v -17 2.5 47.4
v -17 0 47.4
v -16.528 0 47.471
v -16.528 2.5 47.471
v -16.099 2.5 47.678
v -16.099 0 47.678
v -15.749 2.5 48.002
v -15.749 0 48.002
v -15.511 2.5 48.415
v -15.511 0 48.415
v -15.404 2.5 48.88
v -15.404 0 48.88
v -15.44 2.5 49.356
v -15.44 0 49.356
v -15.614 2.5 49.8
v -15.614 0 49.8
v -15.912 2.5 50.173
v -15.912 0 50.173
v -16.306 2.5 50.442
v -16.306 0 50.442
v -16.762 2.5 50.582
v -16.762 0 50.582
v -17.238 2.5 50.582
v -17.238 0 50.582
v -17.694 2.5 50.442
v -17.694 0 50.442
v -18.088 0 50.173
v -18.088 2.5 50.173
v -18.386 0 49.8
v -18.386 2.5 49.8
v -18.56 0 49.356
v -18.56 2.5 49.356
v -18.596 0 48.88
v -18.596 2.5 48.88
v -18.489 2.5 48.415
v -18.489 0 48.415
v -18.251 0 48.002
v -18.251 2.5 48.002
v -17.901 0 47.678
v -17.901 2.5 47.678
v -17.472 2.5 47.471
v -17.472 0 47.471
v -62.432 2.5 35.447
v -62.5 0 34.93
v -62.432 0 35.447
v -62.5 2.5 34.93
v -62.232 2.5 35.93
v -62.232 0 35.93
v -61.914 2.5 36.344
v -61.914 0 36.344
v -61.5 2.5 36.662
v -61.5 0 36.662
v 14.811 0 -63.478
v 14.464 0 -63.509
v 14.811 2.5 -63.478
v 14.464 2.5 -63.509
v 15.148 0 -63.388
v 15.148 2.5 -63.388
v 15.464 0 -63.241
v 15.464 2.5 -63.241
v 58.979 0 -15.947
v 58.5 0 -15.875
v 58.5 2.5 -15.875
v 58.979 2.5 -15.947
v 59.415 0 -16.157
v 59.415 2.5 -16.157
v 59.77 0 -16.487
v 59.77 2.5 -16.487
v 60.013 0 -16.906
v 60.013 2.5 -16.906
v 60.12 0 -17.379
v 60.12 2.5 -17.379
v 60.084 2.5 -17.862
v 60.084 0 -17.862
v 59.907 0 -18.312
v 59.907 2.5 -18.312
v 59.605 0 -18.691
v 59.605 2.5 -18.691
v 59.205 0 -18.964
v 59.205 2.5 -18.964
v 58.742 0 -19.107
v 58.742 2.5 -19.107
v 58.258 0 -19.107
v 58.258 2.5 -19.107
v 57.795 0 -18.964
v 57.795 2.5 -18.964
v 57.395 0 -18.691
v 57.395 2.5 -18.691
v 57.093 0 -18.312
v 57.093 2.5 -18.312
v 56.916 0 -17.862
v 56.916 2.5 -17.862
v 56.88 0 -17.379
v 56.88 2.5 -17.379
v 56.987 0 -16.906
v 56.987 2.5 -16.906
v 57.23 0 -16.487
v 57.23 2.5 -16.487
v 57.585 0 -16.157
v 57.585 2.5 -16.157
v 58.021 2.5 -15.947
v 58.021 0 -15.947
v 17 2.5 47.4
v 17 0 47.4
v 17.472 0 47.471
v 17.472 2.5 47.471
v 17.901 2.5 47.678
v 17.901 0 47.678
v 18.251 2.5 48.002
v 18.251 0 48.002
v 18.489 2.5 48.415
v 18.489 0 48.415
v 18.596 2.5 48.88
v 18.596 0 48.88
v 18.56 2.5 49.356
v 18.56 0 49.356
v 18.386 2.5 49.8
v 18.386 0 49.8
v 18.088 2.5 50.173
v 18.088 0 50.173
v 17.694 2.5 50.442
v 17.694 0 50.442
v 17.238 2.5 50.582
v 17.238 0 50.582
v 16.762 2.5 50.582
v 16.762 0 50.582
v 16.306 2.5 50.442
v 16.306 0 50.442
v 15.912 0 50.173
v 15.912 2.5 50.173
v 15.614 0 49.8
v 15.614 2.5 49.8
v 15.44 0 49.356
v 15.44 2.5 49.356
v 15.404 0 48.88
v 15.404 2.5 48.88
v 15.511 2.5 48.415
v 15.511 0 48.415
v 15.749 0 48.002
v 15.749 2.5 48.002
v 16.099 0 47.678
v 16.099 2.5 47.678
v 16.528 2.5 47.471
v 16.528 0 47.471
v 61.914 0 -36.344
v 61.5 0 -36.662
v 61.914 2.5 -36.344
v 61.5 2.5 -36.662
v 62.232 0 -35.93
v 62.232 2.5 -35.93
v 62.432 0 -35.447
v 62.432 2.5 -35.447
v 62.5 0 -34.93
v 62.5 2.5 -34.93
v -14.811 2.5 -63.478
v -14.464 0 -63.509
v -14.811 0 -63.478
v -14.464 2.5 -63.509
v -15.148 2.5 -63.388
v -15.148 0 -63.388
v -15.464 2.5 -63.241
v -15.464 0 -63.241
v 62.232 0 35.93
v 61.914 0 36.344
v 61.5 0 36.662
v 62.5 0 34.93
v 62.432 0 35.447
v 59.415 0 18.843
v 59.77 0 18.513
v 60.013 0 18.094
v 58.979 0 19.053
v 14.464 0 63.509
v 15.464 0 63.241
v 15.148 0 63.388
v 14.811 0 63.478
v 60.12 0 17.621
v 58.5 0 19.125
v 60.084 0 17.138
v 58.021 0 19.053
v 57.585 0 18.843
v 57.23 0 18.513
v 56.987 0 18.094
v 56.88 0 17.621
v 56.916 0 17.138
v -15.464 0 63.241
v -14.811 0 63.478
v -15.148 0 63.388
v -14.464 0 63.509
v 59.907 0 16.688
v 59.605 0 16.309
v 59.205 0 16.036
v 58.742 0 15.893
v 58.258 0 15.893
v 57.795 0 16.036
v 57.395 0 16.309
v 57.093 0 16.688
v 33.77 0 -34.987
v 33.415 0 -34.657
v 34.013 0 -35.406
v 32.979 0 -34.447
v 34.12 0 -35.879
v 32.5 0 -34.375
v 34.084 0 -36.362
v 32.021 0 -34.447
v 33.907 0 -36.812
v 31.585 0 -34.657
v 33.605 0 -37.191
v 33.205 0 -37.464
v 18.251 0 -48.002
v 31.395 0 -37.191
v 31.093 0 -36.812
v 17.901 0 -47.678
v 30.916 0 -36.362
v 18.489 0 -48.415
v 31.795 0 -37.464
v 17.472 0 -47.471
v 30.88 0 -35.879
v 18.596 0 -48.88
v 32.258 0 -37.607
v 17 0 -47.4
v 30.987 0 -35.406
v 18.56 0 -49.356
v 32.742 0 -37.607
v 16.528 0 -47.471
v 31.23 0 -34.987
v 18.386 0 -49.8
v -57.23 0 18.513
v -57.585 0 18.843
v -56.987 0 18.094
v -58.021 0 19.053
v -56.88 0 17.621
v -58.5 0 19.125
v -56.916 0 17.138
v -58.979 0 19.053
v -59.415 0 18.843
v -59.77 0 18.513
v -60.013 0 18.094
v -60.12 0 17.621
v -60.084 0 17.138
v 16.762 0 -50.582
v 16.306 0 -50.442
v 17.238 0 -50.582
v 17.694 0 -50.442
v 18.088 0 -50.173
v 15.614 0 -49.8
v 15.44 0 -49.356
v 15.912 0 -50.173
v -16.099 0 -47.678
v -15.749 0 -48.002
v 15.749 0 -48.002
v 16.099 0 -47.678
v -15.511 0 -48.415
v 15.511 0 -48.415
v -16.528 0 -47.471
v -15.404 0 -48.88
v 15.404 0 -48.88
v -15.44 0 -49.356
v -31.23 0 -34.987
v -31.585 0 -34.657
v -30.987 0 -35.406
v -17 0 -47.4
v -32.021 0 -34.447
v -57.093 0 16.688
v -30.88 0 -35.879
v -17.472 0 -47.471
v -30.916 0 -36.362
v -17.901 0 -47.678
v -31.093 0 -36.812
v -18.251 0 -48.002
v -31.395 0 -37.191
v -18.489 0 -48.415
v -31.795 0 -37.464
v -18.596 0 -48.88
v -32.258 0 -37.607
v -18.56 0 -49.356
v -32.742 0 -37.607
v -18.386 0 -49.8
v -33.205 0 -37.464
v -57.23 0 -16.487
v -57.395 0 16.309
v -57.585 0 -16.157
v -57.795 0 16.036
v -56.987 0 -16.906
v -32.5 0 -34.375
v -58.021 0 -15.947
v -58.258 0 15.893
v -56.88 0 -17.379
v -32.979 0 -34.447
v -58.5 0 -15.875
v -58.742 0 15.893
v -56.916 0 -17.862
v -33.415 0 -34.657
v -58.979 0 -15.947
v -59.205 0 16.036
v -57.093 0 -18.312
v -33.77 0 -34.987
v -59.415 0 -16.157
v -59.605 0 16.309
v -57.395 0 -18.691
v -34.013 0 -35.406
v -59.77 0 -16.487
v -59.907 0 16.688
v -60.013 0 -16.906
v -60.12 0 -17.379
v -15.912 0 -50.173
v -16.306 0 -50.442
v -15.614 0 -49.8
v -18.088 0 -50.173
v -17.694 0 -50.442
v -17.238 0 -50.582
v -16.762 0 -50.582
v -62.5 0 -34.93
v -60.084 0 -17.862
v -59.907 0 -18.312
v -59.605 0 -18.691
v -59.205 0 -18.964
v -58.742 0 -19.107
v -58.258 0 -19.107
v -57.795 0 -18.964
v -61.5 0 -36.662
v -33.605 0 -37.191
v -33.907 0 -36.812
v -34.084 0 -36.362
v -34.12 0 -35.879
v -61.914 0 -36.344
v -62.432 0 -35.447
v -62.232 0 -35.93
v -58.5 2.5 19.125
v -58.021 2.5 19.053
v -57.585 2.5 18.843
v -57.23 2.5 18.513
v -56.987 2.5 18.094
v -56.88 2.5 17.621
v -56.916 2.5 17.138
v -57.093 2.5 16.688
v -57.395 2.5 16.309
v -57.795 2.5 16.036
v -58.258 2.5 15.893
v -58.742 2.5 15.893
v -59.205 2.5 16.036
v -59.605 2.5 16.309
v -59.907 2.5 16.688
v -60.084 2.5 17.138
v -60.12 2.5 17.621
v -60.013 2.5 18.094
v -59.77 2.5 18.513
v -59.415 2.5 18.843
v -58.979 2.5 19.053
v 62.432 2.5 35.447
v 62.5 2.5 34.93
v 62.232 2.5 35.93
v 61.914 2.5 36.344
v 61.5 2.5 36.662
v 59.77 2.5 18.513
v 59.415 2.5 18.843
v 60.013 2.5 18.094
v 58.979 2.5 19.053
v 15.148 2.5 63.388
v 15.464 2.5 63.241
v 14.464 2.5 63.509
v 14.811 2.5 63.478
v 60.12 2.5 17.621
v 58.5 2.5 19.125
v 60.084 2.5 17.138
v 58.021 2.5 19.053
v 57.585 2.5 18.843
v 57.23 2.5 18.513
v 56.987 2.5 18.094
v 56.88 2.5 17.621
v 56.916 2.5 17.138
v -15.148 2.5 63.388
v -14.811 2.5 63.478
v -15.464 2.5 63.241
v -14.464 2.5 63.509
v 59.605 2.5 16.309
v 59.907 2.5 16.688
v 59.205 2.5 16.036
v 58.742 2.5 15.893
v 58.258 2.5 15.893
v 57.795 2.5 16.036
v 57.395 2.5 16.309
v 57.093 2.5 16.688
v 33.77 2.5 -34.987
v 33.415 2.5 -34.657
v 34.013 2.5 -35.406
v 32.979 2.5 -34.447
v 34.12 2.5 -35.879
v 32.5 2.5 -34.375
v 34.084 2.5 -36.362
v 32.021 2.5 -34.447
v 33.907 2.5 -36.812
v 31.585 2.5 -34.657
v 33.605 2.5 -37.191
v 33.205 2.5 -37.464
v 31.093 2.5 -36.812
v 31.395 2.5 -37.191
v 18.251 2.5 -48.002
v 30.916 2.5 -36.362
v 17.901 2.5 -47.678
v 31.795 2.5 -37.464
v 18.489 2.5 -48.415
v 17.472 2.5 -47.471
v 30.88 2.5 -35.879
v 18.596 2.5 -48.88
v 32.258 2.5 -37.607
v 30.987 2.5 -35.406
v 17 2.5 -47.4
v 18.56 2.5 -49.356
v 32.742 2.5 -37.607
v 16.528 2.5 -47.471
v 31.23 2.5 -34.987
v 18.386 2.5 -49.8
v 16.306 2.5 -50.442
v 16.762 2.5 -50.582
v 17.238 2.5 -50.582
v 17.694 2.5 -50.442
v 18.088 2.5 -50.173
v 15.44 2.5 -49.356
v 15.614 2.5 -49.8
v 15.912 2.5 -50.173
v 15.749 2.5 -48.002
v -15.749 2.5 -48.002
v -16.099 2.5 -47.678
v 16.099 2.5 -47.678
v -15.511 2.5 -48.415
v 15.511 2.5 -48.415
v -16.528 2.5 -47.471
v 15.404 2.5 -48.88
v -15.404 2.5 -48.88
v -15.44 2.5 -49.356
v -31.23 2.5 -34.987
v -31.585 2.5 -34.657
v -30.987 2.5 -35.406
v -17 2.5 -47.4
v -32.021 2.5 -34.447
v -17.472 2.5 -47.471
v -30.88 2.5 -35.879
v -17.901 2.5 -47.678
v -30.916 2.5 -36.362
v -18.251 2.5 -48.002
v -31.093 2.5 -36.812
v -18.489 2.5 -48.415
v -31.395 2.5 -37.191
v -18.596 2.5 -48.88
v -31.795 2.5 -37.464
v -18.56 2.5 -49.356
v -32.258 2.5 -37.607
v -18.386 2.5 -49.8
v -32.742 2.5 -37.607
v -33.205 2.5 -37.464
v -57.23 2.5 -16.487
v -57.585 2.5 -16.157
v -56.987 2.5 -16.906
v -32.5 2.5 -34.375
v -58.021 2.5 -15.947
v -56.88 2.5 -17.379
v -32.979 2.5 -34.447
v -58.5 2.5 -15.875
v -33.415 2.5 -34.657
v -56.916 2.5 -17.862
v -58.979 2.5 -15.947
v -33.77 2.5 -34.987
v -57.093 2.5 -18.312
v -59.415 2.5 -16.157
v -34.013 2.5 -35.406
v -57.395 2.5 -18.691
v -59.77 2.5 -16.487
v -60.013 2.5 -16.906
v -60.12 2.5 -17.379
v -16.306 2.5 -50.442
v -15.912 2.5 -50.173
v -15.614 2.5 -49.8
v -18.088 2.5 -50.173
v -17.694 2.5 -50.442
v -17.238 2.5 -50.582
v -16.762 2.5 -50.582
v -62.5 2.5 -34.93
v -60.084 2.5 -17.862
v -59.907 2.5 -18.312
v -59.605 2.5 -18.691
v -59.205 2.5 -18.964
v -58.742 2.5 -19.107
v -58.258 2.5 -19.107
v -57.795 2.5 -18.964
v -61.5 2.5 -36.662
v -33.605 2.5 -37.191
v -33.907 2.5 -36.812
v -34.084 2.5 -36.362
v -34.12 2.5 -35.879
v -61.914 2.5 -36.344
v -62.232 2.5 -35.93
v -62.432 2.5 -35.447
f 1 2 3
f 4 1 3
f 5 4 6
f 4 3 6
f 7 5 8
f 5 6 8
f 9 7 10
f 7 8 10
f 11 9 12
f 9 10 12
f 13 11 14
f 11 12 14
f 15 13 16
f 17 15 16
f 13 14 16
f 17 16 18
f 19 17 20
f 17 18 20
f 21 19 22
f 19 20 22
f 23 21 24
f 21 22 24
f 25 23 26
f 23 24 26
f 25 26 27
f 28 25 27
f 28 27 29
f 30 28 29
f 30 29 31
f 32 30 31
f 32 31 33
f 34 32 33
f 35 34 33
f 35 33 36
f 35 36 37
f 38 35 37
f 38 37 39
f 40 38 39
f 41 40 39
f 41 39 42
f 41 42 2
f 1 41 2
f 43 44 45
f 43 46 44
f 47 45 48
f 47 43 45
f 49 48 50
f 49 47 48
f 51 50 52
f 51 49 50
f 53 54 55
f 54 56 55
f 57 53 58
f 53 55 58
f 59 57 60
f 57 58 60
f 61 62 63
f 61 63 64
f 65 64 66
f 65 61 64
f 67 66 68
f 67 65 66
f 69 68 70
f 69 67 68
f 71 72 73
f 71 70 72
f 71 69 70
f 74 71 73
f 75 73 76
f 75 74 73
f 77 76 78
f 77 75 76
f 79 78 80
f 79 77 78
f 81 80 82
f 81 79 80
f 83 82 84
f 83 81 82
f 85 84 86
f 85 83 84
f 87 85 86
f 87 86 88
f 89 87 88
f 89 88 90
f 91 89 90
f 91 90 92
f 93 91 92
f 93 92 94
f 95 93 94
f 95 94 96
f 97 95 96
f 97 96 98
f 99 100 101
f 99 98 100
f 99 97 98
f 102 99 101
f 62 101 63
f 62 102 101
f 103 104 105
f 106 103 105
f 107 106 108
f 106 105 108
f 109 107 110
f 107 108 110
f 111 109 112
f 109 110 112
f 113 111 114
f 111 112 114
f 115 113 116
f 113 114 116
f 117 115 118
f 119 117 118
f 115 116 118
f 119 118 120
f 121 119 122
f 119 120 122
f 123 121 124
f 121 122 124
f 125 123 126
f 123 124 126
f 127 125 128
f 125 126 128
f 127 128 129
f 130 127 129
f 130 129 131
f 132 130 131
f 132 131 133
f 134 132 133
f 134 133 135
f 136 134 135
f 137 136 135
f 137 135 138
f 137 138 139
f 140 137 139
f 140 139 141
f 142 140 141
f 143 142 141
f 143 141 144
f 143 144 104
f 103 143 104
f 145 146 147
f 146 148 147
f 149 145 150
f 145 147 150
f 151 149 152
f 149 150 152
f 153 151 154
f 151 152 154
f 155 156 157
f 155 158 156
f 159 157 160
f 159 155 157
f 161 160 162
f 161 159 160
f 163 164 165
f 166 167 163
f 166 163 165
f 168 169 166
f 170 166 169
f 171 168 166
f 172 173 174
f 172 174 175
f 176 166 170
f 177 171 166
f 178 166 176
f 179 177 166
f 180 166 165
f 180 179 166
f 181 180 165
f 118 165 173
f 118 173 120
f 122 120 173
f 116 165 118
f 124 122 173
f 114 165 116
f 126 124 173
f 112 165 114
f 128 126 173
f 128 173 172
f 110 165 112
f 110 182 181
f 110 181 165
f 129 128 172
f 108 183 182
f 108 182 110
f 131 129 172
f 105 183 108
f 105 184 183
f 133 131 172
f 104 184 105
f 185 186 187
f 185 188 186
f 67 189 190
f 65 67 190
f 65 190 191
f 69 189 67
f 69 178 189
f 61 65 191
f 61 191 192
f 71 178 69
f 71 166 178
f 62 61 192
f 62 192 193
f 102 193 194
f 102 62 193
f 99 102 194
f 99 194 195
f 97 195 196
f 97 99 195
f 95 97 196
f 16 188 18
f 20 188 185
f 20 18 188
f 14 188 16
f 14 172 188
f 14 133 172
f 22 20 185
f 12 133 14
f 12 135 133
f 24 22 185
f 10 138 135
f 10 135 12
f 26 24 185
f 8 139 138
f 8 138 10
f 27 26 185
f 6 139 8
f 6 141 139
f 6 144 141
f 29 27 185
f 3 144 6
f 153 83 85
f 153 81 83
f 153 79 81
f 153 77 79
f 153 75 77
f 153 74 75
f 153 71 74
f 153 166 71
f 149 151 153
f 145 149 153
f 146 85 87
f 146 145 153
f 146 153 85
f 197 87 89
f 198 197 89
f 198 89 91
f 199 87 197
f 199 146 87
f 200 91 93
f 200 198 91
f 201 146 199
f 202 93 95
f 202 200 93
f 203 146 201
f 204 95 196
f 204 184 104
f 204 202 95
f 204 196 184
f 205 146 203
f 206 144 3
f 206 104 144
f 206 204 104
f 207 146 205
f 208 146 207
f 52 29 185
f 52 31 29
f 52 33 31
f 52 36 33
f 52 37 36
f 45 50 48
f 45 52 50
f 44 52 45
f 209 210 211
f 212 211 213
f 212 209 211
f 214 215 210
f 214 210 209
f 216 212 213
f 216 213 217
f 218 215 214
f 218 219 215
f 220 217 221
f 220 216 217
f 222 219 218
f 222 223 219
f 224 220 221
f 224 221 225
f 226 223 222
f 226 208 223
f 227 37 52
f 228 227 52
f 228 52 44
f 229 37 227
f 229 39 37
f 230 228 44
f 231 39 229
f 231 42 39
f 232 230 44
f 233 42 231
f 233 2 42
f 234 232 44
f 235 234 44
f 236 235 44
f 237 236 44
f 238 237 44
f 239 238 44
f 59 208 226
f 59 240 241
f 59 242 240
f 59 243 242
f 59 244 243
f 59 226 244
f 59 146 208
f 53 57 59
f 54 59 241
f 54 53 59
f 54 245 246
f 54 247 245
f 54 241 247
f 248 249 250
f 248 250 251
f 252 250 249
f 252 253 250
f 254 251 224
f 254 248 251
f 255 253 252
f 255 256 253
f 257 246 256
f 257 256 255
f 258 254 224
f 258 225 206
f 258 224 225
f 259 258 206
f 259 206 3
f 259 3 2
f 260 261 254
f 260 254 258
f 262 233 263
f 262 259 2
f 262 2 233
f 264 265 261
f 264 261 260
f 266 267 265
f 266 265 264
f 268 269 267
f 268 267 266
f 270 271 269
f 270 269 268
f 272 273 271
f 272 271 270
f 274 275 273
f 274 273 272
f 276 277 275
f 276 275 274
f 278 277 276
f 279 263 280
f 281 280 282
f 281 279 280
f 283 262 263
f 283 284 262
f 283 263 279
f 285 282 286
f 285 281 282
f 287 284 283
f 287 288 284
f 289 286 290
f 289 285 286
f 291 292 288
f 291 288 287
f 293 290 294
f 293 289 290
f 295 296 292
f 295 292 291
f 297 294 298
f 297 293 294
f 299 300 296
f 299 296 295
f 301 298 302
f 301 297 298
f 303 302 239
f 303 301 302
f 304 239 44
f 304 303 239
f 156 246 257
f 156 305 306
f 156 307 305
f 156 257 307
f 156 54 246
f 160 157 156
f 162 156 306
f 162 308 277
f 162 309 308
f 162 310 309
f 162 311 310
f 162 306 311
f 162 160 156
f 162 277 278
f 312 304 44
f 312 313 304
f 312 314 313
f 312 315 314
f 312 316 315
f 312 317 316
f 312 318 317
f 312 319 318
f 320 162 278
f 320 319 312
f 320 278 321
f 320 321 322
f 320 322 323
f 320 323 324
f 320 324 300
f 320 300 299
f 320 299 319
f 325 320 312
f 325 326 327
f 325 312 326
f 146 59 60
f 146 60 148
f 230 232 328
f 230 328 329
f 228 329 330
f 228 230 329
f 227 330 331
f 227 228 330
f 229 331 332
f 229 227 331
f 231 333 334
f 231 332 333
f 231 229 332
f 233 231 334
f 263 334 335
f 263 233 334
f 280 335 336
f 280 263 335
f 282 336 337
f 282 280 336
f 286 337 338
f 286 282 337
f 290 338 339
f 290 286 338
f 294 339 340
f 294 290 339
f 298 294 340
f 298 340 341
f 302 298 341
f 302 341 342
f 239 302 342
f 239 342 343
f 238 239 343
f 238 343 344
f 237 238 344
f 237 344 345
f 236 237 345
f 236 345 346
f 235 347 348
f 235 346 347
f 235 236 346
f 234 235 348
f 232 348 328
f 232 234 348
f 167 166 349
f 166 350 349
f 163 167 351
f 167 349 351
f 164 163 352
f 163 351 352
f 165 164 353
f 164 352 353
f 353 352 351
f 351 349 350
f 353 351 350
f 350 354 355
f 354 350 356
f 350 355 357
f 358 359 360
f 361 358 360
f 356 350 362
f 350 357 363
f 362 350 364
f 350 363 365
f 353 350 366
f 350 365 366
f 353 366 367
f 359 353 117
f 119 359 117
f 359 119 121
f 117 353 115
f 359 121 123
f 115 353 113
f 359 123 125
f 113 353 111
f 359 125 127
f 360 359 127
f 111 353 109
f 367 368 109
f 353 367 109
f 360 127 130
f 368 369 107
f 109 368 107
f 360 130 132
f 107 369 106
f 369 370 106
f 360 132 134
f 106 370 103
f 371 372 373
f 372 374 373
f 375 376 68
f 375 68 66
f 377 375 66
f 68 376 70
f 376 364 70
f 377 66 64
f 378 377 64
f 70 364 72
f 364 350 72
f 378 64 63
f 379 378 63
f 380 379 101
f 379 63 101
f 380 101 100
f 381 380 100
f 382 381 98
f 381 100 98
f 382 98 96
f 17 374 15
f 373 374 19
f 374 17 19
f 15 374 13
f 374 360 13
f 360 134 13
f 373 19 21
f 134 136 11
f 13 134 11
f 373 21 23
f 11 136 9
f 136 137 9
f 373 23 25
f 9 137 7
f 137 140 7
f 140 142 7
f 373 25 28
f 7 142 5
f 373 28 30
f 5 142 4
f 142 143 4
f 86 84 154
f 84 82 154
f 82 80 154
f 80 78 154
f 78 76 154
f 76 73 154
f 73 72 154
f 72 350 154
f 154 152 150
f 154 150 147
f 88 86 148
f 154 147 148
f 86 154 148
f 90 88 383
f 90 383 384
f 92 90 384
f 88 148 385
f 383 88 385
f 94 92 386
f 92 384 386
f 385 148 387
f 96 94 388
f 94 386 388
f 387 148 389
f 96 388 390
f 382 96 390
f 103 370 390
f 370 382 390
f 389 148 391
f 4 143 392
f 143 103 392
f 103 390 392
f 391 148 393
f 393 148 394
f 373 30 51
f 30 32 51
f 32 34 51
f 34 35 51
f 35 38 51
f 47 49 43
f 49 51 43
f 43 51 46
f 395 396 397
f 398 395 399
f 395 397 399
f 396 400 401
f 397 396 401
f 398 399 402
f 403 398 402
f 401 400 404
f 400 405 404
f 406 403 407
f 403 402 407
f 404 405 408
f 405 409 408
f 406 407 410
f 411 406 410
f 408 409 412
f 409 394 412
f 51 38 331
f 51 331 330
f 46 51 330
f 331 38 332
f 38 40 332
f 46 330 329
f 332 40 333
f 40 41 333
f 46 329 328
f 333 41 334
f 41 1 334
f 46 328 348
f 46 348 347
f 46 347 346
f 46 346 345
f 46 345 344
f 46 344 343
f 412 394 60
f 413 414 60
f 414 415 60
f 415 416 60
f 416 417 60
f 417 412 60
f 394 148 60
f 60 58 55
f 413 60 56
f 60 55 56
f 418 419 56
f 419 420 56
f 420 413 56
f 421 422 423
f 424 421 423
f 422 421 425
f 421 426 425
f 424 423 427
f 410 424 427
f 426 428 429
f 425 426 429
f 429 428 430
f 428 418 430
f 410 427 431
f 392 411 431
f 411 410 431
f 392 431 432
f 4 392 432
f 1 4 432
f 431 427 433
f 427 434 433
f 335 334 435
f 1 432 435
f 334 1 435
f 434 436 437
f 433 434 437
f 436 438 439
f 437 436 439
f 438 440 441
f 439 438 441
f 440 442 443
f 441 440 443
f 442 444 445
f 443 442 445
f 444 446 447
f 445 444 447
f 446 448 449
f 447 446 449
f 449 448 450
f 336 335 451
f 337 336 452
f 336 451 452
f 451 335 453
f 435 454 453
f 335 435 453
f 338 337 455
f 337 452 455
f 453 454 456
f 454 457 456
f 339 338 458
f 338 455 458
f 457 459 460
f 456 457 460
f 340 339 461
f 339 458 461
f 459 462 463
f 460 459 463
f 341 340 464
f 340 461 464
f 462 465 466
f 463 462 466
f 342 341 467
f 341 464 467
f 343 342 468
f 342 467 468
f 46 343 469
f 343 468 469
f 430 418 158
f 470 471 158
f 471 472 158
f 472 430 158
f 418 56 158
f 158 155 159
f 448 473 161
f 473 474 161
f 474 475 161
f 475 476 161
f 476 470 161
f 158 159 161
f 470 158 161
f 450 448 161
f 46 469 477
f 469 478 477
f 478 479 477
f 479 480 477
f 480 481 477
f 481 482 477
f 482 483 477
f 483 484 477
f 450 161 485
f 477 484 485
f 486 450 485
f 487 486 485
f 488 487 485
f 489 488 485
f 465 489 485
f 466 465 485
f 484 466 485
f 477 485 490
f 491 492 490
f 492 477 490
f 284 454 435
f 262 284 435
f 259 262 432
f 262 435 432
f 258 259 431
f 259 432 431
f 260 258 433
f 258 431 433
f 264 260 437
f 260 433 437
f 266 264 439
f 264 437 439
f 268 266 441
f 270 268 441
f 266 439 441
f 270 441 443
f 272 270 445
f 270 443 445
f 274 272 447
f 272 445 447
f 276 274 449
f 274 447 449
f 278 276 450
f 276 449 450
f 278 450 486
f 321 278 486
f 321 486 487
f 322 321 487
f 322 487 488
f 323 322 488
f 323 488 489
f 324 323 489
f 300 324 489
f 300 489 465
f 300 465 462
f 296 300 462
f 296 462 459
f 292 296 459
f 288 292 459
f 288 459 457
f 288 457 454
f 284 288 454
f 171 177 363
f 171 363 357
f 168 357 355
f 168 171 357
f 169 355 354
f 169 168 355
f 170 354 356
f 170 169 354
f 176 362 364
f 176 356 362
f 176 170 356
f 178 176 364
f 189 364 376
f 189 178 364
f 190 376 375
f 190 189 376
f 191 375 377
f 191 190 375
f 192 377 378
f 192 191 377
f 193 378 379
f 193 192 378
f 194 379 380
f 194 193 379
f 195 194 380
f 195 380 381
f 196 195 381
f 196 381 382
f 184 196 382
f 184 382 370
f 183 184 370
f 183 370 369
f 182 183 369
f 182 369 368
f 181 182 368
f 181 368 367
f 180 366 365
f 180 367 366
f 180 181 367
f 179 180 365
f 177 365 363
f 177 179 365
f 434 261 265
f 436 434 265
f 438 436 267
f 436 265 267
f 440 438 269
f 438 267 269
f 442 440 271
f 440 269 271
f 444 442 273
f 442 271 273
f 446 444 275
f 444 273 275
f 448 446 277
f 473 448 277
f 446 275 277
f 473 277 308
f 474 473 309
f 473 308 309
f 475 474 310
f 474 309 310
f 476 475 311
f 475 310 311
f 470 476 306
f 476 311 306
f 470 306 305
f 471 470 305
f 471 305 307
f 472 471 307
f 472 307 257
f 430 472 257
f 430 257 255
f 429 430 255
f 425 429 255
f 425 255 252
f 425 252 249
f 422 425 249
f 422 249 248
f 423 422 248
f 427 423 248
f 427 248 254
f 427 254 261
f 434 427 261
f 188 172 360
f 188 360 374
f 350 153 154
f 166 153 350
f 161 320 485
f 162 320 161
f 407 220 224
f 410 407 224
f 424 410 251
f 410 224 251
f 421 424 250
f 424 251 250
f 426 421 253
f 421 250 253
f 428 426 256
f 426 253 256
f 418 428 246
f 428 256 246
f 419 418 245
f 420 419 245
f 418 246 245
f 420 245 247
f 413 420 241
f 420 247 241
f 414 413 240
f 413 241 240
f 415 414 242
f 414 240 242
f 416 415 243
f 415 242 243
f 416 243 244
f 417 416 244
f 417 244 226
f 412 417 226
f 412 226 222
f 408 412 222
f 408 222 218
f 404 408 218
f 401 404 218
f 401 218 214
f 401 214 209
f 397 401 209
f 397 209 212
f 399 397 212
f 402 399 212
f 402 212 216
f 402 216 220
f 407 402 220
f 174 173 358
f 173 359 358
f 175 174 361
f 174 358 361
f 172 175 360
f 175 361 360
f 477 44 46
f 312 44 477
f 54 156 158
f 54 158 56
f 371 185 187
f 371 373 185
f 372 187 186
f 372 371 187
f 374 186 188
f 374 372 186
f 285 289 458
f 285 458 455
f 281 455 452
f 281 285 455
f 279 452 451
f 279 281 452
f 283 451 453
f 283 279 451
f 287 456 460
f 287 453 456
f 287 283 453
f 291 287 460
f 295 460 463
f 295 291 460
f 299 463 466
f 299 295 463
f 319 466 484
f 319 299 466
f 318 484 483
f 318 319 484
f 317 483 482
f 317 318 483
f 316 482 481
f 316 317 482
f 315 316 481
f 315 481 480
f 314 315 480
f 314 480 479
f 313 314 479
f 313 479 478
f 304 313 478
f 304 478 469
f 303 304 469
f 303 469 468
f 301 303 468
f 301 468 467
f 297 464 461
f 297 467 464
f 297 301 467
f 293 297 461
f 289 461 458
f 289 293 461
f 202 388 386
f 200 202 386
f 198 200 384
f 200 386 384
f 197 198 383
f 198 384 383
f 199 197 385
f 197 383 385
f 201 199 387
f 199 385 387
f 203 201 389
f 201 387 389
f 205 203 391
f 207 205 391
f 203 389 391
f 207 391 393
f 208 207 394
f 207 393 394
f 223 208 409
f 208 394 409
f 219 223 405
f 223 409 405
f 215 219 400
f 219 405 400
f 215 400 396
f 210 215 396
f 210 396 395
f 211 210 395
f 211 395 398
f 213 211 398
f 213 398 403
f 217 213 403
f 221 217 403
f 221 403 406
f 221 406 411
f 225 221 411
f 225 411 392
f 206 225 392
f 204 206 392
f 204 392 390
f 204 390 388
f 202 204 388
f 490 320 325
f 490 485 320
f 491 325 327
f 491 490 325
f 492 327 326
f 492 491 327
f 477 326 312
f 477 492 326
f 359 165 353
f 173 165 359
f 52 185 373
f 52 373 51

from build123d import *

# Parameters (mm, degrees)
BOSS_EXTRUDE1_DEPTH     = 2.5
SKETCH3_R               = 1.6
CUT_EXTRUDE1_DEPTH      = 10
SKETCH5_R               = 1.625
CUT_EXTRUDE2_DEPTH      = 10
CUT_EXTRUDE3_DEPTH      = 90.139403932
CUT_EXTRUDE3_DEPTH_BACK = 90.139403932
SKETCH6_R               = 1.625
FILLET1_R               = 2


with BuildPart() as part:
    # Sketch1 → Boss-Extrude1 (new body)
    with BuildSketch(Plane(origin=(0, 0, 0), x_dir=(1, 0, 0), z_dir=(0, 1, 0))):
        Polygon((-15, 63.508529611), (15, 63.508529611), (62.5, 36.084391824), (62.5, -36.084391824), (15, -63.508529611), (-15, -63.508529611), (-62.5, -36.084391824), (-62.5, 36.084391824), align=None)
    extrude(amount=BOSS_EXTRUDE1_DEPTH)

    # Sketch3 → Cut-Extrude1 (cut)
    with BuildSketch(Plane.XZ):
        with Locations(Location((17, 49, 0), (0, 0, 270))):
            Circle(SKETCH3_R)
        with Locations(Location((-17, 49, 0), (0, 0, 270))):
            Circle(SKETCH3_R)
        with Locations(Location((17, -49, 0), (0, 0, 90))):
            Circle(SKETCH3_R)
        with Locations(Location((-17, -49, 0), (0, 0, 90))):
            Circle(SKETCH3_R)
    extrude(amount=-CUT_EXTRUDE1_DEPTH, mode=Mode.SUBTRACT)

    # Sketch5 → Cut-Extrude2 (cut)
    with BuildSketch(Plane(origin=(0, 2.5, 0), x_dir=(1, 0, 0), z_dir=(0, 1, 0))):
        with Locations(Location((-32.5, 36, 0), (0, 0, 270))):
            Circle(SKETCH5_R)
        with Locations(Location((32.5, 36, 0), (0, 0, 270))):
            Circle(SKETCH5_R)
    extrude(amount=-CUT_EXTRUDE2_DEPTH, mode=Mode.SUBTRACT)

    # Sketch6 → Cut-Extrude3 (cut, two sides: drawn at the far end of the back side and taken through both)
    with BuildSketch(Plane(origin=(0, 2.5, 0), x_dir=(1, 0, 0), z_dir=(0, 1, 0)).offset(-CUT_EXTRUDE3_DEPTH_BACK)):
        with Locations(Location((-58.5, 17.5, 0), (0, 0, 270))):
            Circle(SKETCH6_R)
        with Locations(Location((-58.5, -17.5, 0), (0, 0, 270))):
            Circle(SKETCH6_R)
        with Locations(Location((58.5, -17.5, 0), (0, 0, 270))):
            Circle(SKETCH6_R)
        with Locations(Location((58.5, 17.5, 0), (0, 0, 270))):
            Circle(SKETCH6_R)
    extrude(amount=CUT_EXTRUDE3_DEPTH + CUT_EXTRUDE3_DEPTH_BACK, mode=Mode.SUBTRACT)

    # Fillet1
    fillet1_edges = [part.edges().sort_by_distance(p)[0] for p in [
        (-15, 1.25, -63.508529611),
        (15, 1.25, -63.508529611),
        (62.5, 1.25, -36.084391824),
        (62.5, 1.25, 36.084391824),
        (15, 1.25, 63.508529611),
        (-15, 1.25, 63.508529611),
        (-62.5, 1.25, 36.084391824),
        (-62.5, 1.25, -36.084391824),
    ]]
    fillet(fillet1_edges, radius=FILLET1_R)


solid = part.part
